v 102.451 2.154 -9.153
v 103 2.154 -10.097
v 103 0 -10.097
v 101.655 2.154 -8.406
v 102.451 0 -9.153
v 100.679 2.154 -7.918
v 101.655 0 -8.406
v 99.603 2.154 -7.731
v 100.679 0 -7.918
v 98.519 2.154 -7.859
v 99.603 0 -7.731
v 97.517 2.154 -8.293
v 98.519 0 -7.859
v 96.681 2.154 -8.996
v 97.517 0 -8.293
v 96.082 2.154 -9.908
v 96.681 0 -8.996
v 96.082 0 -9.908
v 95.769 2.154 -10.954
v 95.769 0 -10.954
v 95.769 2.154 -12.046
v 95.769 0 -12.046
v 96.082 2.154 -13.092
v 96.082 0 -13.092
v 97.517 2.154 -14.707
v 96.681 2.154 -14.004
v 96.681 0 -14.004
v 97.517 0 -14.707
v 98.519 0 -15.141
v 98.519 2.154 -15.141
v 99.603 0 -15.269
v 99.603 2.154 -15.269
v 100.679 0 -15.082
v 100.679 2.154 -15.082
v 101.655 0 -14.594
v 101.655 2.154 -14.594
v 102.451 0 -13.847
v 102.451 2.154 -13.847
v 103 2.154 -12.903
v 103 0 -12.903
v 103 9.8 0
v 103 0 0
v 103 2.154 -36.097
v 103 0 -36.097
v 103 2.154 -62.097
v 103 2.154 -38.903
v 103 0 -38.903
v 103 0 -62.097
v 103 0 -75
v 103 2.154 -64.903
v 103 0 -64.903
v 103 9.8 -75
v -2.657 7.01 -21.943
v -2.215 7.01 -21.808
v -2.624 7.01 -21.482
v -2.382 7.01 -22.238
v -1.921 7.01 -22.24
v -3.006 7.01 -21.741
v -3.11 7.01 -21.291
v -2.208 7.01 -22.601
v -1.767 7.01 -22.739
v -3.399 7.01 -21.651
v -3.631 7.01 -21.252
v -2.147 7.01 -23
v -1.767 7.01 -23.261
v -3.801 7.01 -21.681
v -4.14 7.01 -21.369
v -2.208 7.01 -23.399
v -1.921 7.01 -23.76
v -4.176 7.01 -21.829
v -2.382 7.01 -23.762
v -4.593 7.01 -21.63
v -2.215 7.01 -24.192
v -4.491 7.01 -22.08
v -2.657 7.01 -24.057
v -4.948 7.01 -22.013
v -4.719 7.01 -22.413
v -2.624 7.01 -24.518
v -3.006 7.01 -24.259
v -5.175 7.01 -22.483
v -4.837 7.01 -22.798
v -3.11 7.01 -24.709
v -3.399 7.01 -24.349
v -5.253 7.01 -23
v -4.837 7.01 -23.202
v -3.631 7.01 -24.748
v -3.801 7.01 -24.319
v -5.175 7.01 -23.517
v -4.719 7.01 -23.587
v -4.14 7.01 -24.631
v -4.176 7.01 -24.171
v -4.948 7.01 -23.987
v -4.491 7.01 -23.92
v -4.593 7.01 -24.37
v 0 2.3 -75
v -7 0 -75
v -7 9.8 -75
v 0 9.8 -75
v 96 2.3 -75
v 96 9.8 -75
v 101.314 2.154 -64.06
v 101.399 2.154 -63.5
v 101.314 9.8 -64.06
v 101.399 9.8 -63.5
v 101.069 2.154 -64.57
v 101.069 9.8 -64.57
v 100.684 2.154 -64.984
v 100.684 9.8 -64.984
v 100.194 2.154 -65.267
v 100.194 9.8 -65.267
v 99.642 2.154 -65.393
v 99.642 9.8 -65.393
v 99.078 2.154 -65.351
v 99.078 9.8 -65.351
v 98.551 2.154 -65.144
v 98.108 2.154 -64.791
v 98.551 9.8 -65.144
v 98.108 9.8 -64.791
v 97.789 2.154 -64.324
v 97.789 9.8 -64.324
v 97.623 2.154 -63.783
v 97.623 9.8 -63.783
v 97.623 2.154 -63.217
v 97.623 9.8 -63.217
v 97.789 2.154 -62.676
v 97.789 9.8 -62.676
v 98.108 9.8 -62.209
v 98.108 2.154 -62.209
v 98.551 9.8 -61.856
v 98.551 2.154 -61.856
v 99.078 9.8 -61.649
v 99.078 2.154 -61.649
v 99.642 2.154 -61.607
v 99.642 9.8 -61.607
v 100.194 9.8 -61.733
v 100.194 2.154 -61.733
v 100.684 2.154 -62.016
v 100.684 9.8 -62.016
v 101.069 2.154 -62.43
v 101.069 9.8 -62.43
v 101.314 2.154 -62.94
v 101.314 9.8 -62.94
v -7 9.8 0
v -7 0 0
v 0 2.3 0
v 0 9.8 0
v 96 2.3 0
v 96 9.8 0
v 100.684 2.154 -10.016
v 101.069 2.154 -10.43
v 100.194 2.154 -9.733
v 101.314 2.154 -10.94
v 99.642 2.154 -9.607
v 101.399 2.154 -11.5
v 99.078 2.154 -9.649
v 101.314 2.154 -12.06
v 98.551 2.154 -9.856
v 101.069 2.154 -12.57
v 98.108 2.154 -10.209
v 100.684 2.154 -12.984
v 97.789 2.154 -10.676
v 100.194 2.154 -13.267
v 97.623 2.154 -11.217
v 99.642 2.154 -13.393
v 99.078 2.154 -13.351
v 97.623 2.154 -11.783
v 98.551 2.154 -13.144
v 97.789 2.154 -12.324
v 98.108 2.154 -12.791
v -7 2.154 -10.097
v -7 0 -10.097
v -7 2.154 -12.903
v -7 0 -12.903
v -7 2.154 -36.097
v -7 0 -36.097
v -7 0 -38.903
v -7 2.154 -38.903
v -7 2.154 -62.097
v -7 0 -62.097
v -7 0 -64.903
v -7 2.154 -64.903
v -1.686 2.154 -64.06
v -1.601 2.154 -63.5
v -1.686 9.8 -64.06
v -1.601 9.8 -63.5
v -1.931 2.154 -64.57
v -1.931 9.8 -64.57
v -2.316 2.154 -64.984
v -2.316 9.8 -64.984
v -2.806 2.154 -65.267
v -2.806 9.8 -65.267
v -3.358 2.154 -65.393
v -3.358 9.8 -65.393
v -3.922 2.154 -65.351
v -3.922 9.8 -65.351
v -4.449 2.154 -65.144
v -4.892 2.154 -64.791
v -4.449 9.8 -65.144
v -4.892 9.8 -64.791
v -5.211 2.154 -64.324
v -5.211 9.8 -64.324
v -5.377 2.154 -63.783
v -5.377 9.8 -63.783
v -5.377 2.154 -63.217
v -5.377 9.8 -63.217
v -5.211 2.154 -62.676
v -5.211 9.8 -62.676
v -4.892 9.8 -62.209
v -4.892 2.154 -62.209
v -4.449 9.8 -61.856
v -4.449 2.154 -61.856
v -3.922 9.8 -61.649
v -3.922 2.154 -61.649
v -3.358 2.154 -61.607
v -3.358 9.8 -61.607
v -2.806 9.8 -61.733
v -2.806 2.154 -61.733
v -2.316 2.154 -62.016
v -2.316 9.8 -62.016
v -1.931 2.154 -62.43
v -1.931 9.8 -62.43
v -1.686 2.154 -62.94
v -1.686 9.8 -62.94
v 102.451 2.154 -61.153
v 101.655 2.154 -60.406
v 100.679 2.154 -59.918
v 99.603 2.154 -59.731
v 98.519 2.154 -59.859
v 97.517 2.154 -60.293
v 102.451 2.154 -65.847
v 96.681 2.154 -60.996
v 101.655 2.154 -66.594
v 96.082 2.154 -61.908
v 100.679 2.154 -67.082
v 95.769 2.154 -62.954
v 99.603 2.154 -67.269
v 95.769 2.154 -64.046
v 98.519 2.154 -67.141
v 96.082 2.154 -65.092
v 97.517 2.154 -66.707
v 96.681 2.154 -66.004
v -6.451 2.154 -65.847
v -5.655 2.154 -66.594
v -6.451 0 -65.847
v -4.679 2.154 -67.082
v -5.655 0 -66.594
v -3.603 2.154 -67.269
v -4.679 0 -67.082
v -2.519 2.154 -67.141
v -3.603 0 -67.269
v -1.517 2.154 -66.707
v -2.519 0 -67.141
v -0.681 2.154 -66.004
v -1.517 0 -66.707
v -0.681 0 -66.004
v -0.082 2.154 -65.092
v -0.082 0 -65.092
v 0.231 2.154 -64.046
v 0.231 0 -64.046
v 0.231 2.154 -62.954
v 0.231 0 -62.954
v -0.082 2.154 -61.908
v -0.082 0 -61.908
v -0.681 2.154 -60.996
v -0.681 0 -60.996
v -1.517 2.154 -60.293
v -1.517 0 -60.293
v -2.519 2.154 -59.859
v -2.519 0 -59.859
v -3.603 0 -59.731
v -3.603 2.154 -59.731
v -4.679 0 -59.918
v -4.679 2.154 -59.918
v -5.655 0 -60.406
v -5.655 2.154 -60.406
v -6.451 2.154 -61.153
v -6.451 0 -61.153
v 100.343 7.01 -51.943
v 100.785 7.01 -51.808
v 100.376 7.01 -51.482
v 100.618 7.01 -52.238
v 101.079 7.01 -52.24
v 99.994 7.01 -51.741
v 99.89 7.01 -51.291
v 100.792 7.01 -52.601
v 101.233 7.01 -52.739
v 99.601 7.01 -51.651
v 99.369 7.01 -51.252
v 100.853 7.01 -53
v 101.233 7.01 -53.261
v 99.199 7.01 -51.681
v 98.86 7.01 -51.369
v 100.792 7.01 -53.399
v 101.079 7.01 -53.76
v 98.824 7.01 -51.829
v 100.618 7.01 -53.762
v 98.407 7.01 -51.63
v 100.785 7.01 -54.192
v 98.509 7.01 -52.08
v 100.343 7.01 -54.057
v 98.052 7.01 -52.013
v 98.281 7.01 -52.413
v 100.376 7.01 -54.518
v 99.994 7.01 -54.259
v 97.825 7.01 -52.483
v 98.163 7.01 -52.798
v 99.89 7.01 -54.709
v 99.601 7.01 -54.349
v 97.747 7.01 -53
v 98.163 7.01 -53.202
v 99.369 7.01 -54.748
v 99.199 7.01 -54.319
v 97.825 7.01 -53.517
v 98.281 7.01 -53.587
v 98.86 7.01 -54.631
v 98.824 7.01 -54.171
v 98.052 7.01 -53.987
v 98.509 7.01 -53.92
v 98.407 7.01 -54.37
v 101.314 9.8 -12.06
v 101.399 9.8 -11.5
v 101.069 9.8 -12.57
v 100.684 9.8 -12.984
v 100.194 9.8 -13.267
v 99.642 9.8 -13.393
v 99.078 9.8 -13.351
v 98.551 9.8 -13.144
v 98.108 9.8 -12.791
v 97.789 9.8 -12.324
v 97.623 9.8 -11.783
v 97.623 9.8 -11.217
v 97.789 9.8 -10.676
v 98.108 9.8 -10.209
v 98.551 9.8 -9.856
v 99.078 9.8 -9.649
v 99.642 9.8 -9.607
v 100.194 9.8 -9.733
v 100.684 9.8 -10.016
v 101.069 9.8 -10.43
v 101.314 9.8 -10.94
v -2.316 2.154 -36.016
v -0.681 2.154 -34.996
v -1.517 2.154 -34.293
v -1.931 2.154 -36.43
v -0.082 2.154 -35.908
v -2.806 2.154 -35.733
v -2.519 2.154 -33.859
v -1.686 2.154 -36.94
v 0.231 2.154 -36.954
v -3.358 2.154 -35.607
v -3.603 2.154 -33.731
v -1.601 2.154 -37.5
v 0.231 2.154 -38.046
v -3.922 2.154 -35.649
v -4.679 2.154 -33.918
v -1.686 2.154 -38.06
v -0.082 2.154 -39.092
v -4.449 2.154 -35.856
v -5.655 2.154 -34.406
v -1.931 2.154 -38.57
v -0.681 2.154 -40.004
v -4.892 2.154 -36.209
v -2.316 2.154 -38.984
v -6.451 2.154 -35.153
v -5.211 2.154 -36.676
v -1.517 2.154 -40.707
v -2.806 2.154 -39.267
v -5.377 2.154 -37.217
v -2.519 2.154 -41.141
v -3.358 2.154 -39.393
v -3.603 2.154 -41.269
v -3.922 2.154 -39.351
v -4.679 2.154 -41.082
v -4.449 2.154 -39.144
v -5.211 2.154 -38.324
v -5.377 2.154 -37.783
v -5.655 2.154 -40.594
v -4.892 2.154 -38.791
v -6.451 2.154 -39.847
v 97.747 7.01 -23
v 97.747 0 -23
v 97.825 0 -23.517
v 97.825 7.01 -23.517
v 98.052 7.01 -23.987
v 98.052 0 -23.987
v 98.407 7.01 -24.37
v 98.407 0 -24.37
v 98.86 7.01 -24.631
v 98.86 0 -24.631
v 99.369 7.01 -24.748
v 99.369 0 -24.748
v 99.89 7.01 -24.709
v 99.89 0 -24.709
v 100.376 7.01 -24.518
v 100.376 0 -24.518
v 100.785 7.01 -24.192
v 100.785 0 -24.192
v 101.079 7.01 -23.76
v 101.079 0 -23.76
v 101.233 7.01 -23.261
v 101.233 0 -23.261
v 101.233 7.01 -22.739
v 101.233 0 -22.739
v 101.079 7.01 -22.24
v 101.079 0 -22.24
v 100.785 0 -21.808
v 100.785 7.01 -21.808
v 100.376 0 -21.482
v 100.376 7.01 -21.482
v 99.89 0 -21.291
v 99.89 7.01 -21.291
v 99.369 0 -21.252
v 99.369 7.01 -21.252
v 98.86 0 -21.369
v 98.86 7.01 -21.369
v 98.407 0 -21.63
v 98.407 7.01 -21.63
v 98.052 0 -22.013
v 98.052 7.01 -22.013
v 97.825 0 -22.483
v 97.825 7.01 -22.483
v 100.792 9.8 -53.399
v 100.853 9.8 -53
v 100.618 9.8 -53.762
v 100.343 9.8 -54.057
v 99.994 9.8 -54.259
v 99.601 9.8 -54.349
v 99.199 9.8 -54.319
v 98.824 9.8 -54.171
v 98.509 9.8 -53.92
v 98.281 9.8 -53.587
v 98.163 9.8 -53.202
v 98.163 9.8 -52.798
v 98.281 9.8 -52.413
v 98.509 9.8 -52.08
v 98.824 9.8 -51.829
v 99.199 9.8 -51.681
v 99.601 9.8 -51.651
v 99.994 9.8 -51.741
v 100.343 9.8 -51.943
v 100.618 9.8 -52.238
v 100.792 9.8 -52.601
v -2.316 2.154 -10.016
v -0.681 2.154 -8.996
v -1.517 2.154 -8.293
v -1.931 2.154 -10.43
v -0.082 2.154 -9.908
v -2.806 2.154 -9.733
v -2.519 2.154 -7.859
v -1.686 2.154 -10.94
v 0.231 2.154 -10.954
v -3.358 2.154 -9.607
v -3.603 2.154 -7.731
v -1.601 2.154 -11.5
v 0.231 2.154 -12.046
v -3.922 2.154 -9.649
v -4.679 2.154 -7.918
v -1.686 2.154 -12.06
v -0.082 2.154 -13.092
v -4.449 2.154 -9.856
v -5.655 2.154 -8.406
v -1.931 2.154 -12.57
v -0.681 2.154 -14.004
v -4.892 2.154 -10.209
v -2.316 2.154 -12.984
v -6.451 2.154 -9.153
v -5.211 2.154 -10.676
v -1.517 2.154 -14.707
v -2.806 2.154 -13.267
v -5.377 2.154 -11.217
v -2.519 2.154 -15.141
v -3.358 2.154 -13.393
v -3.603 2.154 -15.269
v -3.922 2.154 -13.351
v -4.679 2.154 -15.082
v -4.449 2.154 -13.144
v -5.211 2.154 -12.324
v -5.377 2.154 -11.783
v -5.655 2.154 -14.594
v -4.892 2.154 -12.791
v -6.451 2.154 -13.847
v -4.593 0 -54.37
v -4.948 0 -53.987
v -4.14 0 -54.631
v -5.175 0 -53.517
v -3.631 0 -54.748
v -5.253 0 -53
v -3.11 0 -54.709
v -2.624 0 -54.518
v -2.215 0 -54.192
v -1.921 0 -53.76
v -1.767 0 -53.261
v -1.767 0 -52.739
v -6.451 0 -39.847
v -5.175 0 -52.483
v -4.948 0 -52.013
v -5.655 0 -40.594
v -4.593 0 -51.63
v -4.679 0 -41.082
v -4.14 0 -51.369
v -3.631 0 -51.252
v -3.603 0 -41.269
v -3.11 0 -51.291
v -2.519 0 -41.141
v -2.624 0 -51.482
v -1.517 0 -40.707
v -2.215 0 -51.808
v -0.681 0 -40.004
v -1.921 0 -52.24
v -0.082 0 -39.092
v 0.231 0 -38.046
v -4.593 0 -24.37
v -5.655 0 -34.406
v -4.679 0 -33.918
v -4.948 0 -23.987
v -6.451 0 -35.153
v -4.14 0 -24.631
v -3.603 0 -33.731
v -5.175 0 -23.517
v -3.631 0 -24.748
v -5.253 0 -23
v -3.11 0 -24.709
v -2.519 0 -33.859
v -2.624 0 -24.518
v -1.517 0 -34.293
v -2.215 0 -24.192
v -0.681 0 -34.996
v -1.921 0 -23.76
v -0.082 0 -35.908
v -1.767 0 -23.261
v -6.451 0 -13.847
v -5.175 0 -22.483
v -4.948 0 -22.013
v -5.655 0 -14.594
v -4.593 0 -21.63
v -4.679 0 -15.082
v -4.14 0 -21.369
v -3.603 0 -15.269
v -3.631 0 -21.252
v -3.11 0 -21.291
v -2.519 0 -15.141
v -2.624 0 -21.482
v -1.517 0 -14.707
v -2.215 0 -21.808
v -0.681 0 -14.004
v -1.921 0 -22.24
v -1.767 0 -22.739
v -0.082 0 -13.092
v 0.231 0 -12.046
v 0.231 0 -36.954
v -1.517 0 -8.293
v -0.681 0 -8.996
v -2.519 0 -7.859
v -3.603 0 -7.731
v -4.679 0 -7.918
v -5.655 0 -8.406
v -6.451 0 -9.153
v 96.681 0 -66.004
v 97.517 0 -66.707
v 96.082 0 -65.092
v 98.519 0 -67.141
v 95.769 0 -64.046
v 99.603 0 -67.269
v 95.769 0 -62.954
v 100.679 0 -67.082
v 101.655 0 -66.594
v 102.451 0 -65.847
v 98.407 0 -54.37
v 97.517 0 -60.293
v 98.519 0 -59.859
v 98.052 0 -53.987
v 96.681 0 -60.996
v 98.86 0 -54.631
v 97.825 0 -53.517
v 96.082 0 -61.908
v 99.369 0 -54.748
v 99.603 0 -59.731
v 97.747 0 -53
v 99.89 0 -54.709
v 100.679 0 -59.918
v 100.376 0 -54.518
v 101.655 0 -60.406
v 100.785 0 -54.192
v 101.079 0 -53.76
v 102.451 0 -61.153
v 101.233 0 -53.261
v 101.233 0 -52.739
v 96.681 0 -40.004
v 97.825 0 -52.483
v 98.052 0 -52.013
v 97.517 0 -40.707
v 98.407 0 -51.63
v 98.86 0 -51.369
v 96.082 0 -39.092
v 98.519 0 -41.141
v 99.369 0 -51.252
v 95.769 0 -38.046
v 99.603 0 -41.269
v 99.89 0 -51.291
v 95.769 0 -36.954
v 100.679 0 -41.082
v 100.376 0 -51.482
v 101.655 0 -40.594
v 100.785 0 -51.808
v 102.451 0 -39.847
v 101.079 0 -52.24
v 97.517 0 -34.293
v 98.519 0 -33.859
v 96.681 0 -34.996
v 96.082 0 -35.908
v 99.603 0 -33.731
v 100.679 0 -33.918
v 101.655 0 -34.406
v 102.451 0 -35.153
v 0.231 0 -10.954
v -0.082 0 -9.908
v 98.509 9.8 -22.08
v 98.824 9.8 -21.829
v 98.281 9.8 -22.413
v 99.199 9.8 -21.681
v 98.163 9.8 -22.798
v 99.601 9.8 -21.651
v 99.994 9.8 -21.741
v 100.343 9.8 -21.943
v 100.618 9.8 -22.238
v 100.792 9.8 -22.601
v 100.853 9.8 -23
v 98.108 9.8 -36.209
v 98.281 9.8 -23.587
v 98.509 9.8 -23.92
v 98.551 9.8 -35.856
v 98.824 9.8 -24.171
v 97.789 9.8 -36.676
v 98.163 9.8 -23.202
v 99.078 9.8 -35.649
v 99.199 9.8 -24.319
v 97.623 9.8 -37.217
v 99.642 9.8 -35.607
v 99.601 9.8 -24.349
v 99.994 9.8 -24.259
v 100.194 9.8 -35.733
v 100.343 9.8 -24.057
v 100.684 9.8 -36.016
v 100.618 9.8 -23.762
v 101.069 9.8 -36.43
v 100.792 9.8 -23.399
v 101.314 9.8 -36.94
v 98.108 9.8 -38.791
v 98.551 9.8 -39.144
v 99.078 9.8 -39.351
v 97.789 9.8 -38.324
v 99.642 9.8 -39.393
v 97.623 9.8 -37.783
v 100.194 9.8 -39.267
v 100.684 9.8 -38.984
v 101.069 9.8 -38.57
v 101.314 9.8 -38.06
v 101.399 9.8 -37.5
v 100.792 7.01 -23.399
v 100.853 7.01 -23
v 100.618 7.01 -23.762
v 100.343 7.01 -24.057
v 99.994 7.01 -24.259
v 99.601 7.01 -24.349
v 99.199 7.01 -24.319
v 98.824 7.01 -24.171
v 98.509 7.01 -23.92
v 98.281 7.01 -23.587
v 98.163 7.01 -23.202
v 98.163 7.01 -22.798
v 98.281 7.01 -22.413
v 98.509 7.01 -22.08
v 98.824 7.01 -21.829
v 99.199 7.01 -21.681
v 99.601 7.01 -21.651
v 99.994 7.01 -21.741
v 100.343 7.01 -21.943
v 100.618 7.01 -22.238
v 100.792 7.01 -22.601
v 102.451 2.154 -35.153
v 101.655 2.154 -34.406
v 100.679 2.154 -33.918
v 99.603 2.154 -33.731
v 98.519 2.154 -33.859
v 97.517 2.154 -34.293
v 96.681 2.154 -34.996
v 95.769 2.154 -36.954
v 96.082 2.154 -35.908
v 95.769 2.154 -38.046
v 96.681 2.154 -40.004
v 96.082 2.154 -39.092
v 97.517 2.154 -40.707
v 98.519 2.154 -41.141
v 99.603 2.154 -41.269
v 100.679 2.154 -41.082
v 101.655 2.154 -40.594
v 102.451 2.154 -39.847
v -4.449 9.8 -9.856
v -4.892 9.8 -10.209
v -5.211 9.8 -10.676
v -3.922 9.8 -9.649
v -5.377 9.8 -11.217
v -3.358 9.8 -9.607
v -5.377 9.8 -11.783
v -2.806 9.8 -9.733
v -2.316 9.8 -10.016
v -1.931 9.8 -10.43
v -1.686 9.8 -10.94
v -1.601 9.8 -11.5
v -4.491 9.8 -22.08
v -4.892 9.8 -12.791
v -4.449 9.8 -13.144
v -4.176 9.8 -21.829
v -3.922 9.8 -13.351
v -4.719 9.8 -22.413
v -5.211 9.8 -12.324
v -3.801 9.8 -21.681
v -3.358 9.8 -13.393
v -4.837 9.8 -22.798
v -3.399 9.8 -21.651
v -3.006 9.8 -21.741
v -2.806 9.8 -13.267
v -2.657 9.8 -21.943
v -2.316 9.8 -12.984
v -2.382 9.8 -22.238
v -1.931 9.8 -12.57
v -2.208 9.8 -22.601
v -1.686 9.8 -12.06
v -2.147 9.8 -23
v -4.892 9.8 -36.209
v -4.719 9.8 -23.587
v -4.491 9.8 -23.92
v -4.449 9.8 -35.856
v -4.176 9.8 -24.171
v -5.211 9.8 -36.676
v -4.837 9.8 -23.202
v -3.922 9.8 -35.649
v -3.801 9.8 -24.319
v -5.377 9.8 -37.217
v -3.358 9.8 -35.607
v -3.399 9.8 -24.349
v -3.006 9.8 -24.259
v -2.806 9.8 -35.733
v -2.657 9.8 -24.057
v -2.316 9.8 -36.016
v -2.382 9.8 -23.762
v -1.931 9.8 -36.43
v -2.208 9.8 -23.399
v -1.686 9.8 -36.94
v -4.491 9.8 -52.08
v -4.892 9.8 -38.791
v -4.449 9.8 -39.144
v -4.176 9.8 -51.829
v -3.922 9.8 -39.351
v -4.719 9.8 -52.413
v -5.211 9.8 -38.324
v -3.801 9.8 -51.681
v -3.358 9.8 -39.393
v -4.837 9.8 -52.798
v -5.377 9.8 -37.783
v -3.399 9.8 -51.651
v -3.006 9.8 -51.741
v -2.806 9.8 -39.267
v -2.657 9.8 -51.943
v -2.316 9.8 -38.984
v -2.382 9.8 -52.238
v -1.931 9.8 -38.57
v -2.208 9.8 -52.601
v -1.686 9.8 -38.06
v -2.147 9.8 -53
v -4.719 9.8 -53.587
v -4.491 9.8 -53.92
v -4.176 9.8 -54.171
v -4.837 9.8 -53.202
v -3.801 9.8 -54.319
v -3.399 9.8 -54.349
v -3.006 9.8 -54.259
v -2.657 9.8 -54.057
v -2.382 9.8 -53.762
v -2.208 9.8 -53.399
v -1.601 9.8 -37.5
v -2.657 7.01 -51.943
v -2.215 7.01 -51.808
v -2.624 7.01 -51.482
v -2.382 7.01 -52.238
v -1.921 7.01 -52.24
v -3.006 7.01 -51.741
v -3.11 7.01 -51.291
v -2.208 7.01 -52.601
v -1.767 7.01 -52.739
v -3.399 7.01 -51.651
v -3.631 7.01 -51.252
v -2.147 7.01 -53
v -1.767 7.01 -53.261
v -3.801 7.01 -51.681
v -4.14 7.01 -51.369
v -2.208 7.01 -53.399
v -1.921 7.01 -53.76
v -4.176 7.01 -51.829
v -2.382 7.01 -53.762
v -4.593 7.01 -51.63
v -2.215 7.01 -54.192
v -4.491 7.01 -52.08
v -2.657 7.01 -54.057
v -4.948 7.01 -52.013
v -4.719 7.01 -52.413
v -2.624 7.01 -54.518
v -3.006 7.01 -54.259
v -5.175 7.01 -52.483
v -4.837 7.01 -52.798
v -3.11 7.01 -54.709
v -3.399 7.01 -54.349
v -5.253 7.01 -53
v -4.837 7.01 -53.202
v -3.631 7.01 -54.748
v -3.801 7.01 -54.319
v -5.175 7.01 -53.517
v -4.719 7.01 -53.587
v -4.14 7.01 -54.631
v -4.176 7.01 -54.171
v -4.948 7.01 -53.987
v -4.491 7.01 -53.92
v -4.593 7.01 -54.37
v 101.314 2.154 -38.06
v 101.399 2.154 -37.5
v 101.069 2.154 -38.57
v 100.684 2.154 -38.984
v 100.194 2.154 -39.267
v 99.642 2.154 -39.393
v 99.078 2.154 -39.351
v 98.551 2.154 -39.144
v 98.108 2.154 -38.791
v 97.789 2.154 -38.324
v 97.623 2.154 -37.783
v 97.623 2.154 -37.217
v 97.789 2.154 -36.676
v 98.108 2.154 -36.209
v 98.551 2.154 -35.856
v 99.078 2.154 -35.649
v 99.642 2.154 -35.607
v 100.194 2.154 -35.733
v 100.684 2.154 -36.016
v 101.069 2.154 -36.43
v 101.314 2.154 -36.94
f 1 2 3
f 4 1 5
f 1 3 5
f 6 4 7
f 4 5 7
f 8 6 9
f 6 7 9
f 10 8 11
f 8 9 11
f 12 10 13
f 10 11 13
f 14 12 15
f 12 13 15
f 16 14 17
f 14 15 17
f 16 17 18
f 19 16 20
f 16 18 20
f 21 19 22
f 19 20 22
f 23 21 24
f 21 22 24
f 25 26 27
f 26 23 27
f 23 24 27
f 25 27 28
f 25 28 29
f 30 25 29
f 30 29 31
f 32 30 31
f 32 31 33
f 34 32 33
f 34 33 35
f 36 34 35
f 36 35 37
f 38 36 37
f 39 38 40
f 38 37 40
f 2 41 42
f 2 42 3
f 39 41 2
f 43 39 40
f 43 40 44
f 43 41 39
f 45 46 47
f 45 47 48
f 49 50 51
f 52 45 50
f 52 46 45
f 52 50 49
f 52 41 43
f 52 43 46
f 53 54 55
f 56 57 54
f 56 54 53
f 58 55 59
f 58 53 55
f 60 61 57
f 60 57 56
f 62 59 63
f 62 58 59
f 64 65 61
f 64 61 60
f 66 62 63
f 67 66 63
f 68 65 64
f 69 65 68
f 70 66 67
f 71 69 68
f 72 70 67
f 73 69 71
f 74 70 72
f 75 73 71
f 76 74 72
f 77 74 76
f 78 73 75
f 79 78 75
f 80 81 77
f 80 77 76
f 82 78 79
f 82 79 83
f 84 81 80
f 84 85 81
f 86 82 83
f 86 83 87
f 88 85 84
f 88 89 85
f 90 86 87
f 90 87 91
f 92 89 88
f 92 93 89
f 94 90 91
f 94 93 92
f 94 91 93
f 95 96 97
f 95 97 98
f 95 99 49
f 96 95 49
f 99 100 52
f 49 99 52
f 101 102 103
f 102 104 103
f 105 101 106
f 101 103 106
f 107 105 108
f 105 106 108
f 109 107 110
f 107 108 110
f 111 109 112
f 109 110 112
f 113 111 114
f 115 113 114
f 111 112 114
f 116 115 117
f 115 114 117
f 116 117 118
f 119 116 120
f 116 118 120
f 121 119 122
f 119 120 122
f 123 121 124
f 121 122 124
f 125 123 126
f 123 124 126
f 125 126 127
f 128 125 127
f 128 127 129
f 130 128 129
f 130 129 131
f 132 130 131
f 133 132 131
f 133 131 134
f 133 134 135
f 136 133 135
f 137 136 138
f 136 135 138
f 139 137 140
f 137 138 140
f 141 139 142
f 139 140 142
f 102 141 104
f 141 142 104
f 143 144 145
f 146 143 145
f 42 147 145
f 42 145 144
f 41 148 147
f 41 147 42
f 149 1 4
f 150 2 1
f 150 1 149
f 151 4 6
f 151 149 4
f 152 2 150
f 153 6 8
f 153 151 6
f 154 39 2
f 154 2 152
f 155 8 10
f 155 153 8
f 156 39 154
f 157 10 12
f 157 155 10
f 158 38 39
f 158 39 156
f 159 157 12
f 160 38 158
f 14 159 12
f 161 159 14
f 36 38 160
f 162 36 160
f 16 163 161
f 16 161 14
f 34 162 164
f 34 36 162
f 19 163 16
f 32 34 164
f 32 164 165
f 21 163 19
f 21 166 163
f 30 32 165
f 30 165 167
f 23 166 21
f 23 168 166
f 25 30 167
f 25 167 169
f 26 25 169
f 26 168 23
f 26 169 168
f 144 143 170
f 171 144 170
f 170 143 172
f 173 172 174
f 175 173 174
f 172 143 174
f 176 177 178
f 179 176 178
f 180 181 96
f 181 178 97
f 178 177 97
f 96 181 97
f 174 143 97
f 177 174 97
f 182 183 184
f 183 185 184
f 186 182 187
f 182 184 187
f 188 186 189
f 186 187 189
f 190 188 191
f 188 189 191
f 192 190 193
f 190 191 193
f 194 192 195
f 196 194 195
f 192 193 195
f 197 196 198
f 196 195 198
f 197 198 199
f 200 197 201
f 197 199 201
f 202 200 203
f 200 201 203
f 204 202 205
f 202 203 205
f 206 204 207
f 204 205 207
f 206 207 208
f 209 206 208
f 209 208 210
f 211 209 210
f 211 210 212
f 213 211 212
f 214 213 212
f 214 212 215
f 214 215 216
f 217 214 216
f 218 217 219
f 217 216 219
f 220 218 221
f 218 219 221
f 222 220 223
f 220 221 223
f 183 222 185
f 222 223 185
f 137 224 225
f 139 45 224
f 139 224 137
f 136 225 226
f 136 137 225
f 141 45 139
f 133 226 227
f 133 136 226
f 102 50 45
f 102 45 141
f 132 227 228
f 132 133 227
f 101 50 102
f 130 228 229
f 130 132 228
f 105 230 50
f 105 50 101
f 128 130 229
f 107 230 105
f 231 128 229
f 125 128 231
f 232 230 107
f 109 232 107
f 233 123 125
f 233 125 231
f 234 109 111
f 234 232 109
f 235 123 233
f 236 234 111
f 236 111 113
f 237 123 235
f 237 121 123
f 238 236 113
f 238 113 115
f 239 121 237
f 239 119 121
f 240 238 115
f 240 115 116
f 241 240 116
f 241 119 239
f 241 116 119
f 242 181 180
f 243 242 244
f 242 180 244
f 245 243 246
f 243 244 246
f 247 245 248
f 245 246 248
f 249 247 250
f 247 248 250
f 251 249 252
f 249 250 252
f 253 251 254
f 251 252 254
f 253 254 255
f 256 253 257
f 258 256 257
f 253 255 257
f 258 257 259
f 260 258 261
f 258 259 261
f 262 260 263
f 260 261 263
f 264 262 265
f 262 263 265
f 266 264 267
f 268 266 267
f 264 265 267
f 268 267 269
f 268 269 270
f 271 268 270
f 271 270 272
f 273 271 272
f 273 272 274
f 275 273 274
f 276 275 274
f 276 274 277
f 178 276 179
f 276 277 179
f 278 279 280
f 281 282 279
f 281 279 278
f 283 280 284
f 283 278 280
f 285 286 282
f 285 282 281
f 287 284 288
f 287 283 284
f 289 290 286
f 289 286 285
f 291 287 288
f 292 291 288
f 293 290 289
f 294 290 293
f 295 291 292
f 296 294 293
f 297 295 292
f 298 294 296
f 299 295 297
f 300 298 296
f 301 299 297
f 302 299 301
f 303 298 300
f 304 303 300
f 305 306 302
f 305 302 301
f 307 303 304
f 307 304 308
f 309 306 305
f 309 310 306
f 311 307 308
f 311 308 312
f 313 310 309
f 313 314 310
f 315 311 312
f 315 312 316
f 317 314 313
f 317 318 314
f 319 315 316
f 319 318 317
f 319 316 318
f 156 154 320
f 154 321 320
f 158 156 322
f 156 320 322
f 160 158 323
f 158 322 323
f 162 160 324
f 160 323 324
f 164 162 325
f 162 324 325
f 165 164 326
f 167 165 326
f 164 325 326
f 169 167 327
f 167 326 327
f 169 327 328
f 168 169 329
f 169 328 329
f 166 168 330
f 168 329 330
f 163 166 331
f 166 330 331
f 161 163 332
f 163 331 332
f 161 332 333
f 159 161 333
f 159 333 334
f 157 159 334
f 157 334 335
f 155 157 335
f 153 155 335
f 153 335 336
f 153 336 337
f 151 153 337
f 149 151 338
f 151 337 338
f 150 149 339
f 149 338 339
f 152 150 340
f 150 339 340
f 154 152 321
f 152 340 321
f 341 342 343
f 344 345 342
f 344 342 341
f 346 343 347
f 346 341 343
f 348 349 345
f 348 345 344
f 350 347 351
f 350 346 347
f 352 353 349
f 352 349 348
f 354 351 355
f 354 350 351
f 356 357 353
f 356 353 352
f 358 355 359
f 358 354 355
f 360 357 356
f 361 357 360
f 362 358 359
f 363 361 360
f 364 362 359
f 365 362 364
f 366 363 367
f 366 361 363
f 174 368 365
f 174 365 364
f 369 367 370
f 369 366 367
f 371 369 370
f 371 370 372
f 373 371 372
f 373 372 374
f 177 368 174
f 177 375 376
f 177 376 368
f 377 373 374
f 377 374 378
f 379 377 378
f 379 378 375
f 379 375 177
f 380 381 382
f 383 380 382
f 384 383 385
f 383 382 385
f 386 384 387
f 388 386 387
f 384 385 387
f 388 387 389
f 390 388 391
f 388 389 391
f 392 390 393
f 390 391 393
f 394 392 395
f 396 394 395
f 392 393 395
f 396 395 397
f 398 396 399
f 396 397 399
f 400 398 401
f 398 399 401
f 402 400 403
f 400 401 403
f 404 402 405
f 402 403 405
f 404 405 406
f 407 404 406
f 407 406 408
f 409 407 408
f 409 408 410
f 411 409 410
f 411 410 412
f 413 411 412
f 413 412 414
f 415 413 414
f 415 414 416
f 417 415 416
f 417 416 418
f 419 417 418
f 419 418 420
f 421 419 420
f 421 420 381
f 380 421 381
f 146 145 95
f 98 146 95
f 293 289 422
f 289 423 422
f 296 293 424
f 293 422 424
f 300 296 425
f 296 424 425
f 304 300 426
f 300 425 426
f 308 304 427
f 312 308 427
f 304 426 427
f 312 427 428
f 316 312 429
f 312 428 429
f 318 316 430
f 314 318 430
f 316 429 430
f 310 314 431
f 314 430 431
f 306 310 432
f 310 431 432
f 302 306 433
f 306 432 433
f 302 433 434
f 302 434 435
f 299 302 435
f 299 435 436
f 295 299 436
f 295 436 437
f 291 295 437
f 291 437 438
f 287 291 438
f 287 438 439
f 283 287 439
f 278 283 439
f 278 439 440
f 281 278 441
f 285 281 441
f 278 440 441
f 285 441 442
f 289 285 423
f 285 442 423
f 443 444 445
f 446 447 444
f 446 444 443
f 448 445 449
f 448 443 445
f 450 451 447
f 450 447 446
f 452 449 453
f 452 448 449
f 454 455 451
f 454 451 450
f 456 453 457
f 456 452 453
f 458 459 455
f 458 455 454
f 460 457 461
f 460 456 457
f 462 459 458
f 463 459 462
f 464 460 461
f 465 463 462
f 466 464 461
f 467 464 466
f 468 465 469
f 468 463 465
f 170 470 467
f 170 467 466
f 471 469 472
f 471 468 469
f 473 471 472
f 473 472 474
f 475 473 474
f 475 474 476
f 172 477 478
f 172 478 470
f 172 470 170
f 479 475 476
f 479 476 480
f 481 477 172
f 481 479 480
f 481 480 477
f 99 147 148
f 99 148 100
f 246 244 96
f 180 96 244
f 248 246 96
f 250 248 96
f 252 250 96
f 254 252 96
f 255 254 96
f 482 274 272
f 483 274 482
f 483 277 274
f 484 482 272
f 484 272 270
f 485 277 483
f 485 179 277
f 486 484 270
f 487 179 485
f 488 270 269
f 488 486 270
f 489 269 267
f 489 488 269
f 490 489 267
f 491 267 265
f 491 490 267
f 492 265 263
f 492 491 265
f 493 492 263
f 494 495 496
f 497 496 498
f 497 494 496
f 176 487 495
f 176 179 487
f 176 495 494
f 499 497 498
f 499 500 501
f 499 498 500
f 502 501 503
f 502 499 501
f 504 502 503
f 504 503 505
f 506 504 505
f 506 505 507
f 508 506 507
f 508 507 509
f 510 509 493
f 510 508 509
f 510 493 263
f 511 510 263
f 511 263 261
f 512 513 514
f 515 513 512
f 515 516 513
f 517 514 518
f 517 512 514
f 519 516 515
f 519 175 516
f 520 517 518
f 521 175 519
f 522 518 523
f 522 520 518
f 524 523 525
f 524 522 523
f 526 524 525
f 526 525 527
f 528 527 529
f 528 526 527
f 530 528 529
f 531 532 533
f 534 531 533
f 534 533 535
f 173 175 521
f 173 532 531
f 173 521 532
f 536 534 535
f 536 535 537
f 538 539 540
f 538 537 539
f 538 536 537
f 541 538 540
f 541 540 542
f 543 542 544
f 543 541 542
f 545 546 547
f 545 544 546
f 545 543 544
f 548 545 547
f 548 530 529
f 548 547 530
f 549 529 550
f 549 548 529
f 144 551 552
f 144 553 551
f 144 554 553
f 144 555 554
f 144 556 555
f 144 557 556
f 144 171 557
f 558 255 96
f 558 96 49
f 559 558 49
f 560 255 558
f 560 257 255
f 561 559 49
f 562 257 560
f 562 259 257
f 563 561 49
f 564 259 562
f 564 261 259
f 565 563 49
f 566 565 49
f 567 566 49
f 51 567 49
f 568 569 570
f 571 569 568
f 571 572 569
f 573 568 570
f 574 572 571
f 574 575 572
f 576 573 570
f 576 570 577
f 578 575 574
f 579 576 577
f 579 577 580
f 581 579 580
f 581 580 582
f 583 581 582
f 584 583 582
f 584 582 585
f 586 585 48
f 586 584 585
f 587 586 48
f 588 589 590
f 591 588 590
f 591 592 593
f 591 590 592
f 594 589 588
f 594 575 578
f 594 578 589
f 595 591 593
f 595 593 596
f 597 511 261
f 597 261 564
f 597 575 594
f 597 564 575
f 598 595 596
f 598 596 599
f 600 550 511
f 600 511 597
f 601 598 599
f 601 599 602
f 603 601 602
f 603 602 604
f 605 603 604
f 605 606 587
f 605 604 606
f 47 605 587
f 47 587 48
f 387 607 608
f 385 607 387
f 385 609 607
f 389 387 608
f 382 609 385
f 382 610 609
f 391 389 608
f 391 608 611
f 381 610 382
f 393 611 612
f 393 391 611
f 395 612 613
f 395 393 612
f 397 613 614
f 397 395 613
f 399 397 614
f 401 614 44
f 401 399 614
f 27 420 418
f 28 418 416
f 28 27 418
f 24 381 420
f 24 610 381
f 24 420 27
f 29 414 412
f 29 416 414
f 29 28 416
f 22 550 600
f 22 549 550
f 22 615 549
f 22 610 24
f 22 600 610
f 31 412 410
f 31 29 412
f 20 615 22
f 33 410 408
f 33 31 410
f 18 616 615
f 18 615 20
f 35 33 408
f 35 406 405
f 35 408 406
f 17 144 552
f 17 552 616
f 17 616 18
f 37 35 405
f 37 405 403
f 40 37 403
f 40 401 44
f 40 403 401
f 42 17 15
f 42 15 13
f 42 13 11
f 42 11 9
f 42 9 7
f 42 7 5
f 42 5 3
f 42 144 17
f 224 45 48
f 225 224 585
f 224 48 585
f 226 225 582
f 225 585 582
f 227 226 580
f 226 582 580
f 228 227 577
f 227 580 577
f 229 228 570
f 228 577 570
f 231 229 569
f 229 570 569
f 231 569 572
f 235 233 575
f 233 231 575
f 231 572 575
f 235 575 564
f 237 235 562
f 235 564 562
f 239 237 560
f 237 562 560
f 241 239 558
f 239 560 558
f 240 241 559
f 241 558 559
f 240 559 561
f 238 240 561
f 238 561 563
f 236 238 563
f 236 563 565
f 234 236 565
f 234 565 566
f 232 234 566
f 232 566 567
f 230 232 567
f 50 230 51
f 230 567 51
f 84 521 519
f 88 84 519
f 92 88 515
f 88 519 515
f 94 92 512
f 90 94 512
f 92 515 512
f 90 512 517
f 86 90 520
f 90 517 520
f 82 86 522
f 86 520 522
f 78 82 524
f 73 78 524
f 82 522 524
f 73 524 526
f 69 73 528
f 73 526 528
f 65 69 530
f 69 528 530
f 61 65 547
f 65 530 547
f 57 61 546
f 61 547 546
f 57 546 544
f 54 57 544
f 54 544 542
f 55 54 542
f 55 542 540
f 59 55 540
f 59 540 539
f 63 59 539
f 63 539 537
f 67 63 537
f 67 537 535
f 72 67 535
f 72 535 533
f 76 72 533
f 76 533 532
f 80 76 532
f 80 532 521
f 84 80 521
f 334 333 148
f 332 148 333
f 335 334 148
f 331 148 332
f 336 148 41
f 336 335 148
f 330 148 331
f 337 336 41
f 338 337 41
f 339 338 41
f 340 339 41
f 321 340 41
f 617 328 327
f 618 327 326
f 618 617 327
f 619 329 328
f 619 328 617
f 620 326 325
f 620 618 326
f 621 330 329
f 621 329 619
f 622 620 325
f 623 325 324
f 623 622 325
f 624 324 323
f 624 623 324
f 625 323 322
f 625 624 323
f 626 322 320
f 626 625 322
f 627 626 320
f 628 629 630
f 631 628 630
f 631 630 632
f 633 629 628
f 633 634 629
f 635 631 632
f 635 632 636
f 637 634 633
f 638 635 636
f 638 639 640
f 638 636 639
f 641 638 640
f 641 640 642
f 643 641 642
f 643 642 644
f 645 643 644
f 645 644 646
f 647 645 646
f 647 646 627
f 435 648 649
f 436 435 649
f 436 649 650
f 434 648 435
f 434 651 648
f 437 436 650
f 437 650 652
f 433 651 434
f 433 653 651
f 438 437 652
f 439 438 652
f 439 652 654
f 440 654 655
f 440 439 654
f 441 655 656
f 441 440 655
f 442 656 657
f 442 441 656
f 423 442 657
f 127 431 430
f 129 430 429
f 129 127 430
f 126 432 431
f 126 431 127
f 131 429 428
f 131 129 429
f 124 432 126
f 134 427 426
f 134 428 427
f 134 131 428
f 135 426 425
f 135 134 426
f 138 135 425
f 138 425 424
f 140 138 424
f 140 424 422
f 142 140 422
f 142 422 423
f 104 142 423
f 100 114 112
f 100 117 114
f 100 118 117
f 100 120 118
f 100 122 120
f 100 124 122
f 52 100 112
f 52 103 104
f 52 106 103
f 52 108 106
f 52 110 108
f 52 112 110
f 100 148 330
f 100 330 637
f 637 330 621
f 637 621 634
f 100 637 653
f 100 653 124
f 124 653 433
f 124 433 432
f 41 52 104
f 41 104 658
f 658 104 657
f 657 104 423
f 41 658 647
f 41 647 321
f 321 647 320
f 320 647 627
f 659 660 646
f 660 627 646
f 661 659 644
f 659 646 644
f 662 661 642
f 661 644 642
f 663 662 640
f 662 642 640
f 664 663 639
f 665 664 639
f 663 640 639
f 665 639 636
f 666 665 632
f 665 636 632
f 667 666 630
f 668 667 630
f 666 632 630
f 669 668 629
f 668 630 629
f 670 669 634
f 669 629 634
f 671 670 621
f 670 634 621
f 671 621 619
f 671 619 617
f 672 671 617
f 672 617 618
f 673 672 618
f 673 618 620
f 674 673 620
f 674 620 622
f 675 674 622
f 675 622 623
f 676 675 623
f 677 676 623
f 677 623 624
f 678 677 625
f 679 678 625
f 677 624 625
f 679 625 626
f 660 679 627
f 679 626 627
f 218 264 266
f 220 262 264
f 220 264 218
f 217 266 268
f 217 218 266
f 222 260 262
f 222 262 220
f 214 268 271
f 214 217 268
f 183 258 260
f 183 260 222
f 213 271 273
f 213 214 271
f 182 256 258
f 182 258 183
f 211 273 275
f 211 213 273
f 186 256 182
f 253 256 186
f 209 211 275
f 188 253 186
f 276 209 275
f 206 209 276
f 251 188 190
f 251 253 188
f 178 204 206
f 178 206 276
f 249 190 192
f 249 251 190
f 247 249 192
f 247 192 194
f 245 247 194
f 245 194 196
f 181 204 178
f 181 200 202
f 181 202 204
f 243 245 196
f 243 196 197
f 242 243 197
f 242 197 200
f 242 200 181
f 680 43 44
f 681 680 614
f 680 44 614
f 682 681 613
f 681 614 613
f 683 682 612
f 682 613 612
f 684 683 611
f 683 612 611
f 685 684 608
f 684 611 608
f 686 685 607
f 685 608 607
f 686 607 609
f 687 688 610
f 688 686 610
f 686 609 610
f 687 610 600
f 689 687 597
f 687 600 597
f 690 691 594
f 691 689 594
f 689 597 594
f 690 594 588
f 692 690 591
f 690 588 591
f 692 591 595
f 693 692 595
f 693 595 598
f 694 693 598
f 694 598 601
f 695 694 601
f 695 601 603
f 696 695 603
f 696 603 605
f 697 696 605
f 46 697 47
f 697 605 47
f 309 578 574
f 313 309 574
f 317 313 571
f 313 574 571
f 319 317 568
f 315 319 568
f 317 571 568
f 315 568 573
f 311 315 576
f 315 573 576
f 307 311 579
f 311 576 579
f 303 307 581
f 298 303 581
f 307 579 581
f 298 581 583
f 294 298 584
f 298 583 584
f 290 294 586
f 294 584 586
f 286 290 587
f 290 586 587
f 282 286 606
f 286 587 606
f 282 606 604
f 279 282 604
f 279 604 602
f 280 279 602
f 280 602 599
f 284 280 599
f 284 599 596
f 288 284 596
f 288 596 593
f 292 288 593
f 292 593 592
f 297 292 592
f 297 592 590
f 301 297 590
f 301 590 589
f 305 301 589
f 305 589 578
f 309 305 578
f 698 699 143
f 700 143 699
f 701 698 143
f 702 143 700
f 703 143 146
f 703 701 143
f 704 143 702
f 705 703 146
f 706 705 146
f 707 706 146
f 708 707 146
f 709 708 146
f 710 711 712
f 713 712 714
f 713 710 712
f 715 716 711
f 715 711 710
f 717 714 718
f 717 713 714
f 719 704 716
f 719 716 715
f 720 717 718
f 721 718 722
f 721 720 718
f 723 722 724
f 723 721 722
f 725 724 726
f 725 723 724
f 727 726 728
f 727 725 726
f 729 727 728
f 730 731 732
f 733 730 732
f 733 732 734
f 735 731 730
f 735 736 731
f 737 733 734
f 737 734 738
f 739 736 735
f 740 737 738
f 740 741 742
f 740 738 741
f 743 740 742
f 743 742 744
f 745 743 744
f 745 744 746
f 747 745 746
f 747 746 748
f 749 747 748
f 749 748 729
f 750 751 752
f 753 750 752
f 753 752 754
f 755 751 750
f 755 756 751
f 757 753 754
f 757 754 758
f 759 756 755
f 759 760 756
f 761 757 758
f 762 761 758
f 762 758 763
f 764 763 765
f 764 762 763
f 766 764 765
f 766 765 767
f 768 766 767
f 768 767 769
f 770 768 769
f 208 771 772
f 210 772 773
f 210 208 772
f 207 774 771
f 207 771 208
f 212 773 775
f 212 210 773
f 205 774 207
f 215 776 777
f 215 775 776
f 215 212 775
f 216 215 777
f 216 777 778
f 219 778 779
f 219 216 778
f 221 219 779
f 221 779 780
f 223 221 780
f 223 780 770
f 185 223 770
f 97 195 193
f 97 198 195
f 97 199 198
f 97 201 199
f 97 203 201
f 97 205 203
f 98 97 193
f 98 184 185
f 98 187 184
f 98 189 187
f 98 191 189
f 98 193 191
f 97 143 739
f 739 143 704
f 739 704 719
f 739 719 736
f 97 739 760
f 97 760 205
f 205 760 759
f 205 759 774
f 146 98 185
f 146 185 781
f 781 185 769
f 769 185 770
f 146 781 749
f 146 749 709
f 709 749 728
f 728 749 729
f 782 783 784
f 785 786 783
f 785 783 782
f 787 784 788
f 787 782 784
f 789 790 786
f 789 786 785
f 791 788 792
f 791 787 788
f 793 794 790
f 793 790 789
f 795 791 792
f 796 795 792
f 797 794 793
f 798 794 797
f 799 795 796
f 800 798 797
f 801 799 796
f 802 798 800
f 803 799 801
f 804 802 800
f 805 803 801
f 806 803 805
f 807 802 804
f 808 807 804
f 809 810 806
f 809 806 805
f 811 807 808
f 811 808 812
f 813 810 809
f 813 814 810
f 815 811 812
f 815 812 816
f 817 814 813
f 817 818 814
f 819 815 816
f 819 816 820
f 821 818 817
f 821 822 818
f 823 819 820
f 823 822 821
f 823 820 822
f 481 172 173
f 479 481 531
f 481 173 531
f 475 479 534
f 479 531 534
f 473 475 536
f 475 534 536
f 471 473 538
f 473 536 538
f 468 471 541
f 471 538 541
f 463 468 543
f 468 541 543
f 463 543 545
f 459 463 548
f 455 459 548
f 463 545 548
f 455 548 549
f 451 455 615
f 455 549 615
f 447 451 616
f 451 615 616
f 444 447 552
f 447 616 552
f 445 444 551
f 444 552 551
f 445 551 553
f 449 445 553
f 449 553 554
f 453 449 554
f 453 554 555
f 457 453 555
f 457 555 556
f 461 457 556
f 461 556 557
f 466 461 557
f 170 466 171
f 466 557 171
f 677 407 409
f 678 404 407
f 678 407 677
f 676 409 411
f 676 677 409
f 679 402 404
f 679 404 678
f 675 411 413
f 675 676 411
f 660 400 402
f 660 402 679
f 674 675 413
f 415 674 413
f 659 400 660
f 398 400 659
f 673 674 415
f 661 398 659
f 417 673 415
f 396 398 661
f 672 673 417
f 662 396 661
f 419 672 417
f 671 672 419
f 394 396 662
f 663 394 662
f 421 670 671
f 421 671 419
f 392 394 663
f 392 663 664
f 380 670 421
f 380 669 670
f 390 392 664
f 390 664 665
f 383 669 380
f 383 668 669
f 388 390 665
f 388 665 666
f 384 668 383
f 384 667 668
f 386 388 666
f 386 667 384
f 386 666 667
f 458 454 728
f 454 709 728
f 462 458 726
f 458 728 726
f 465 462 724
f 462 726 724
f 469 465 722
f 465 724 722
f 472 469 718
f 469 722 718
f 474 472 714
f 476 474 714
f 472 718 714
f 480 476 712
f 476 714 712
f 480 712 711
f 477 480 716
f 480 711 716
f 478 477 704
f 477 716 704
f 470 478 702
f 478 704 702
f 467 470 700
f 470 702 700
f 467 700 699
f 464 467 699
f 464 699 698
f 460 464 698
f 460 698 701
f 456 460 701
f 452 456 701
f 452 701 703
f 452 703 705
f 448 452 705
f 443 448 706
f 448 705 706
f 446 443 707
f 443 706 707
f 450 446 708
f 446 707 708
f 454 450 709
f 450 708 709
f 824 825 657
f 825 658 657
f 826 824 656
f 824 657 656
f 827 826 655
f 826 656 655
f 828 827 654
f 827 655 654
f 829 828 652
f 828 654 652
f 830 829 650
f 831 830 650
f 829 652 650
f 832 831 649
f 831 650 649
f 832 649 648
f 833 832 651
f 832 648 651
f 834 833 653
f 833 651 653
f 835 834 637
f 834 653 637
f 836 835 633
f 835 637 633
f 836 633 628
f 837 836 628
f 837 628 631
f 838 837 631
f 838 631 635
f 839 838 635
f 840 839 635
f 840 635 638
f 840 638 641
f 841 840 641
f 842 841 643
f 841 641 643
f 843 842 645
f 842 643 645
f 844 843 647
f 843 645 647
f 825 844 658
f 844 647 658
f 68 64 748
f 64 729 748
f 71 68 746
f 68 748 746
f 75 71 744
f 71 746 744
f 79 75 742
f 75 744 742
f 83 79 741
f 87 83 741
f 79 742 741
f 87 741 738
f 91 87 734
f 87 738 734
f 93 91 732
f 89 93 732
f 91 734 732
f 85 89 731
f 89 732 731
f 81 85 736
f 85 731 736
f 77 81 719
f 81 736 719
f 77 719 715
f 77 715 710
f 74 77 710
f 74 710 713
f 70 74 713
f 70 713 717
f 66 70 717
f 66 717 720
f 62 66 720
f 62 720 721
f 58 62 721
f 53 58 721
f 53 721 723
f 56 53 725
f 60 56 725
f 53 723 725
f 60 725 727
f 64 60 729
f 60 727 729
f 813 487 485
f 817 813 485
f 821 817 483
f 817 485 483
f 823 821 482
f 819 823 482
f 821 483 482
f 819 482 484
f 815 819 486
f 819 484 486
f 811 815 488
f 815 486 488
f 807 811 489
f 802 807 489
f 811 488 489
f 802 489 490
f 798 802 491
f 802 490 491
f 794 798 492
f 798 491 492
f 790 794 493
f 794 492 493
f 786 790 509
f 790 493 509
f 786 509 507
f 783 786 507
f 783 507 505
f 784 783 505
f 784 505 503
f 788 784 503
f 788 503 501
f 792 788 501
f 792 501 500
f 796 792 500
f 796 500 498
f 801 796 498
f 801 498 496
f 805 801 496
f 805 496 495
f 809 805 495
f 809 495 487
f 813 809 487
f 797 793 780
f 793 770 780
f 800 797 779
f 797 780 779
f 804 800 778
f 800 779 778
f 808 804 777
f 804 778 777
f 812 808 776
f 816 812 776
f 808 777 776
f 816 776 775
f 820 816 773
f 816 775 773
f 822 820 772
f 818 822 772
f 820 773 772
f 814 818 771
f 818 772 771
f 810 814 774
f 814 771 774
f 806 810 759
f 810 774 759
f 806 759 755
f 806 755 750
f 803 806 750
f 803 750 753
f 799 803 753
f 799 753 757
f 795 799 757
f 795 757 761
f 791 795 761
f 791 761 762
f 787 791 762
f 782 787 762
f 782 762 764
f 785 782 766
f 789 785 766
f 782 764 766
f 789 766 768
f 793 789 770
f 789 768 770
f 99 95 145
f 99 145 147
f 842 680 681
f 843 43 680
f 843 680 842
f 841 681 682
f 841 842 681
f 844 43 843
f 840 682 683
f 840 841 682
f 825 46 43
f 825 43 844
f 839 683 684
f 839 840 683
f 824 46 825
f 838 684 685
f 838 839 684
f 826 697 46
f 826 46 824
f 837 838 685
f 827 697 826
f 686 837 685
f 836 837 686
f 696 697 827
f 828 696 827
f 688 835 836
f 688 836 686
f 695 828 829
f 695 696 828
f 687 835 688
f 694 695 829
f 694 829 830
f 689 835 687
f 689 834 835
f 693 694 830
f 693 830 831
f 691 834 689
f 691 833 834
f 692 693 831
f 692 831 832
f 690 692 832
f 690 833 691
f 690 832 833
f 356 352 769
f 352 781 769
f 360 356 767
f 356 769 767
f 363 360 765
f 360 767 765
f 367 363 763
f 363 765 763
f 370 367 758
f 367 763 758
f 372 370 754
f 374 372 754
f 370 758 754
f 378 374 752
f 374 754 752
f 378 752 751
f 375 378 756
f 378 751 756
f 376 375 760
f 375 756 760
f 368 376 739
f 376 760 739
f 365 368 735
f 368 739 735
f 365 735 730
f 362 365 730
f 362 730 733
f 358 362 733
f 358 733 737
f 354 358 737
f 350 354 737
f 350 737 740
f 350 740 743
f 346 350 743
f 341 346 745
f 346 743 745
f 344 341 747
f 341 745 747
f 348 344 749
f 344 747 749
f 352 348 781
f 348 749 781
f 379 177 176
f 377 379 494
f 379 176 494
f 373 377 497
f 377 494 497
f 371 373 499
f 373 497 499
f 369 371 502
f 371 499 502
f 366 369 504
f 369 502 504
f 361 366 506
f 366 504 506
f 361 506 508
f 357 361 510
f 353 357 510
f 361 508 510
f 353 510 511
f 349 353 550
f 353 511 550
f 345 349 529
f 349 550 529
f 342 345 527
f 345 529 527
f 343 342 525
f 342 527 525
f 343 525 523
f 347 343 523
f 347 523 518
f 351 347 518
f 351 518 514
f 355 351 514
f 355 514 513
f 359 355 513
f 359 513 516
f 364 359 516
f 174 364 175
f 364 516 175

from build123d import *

# Parameters (mm, degrees)
SKETCH1_W                                      = 96
SKETCH1_H                                      = 75
BOSS_EXTRUDE1_DEPTH                            = 2.3
SKETCH2_W                                      = 7
SKETCH2_H                                      = 75
BOSS_EXTRUDE2_DEPTH                            = 7.5
BOSS_EXTRUDE2_DEPTH_BACK                       = 2.3
BOSS_EXTRUDE3_REACH                            = 9.5
SKETCH3_W                                      = 7
SKETCH3_H                                      = 75
BOSS_EXTRUDE3_DIRECTION_2_REACH                = 4.3
F_6_32_TAPPED_HOLE1_D                          = 2.7051
F_6_32_TAPPED_HOLE1_CBORE_D                    = 3.5052
F_6_32_TAPPED_HOLE1_CBORE_DEPTH                = 7.01
CBORE_FOR_6_BUTTON_HEAD_CAP_SCREW1_D           = 3.7973
CBORE_FOR_6_BUTTON_HEAD_CAP_SCREW1_CBORE_D     = 7.54126
CBORE_FOR_6_BUTTON_HEAD_CAP_SCREW1_CBORE_DEPTH = 2.1541994


with BuildPart() as part:
    # Sketch1 → Boss-Extrude1 (new body)
    with BuildSketch(Plane(origin=(0, 0, 0), x_dir=(1, 0, 0), z_dir=(0, 1, 0))):
        with Locations((48, 37.5)):
            Rectangle(SKETCH1_W, SKETCH1_H)
    extrude(amount=BOSS_EXTRUDE1_DEPTH)

    # Sketch2 → Boss-Extrude2 (add, two sides)
    with BuildSketch(Plane(origin=(0, 2.3, 0), x_dir=(1, 0, 0), z_dir=(0, 1, 0))) as boss_extrude2_sk:
        with Locations((-3.5, 37.5)):
            Rectangle(SKETCH2_W, SKETCH2_H)
    extrude(amount=BOSS_EXTRUDE2_DEPTH)
    extrude(boss_extrude2_sk.sketch, amount=-BOSS_EXTRUDE2_DEPTH_BACK)

    # Boss-Extrude3: up to this face of the body (flat: up to its plane)
    boss_extrude3_end = Plane(part.part.faces().sort_by_distance((-3.5, 9.8, -37.5))[0])
    # Sketch3 → Boss-Extrude3 (add, up to the picked face)
    with BuildSketch(Plane(origin=(0, 2.3, 0), x_dir=(1, 0, 0), z_dir=(0, 1, 0)), mode=Mode.PRIVATE) as boss_extrude3_sk1:
        with Locations((99.5, 37.5)):
            Rectangle(SKETCH3_W, SKETCH3_H)
    boss_extrude3_tool1 = split(extrude(boss_extrude3_sk1.sketch, amount=BOSS_EXTRUDE3_REACH, mode=Mode.PRIVATE), bisect_by=boss_extrude3_end, keep=Keep.BOTH, mode=Mode.PRIVATE)
    add(boss_extrude3_tool1.solids().sort_by_distance((99.5, 2.3, -37.5))[0])

    # Boss-Extrude3 direction 2: up to this face of the body (flat: up to its plane)
    boss_extrude3_direction_2_end = Plane(part.part.faces().sort_by_distance((44.5, 0, -37.5))[0])
    # Sketch3 → Boss-Extrude3 direction 2 (add, up to the picked face)
    with BuildSketch(Plane(origin=(0, 2.3, 0), x_dir=(1, 0, 0), z_dir=(0, 1, 0)), mode=Mode.PRIVATE) as boss_extrude3_direction_2_sk1:
        with Locations((99.5, 37.5)):
            Rectangle(SKETCH3_W, SKETCH3_H)
    boss_extrude3_direction_2_tool1 = split(extrude(boss_extrude3_direction_2_sk1.sketch, amount=-BOSS_EXTRUDE3_DIRECTION_2_REACH, mode=Mode.PRIVATE), bisect_by=boss_extrude3_direction_2_end, keep=Keep.BOTH, mode=Mode.PRIVATE)
    add(boss_extrude3_direction_2_tool1.solids().sort_by_distance((99.5, 2.3, -37.5))[0])

    # #6-32 Tapped Hole1 (through all)
    with Locations(Plane(origin=(0, 0, 0), x_dir=(-1, 0, 0), z_dir=(0, -1, 0))):
        with Locations((-99.5, 23), (-99.5, 53), (3.5, 23), (3.5, 53)):
            CounterBoreHole(F_6_32_TAPPED_HOLE1_D / 2, F_6_32_TAPPED_HOLE1_CBORE_D / 2, F_6_32_TAPPED_HOLE1_CBORE_DEPTH)

    # CBORE for #6 Button Head Cap Screw1 (through all)
    with Locations(Plane(origin=(0, 0, 0), x_dir=(-1, 0, 0), z_dir=(0, -1, 0))):
        with Locations((-99.5, 63.5), (-99.5, 37.5), (-99.5, 11.5), (3.5, 11.5), (3.5, 37.5), (3.5, 63.5)):
            CounterBoreHole(CBORE_FOR_6_BUTTON_HEAD_CAP_SCREW1_D / 2, CBORE_FOR_6_BUTTON_HEAD_CAP_SCREW1_CBORE_D / 2, CBORE_FOR_6_BUTTON_HEAD_CAP_SCREW1_CBORE_DEPTH)


solid = part.part
